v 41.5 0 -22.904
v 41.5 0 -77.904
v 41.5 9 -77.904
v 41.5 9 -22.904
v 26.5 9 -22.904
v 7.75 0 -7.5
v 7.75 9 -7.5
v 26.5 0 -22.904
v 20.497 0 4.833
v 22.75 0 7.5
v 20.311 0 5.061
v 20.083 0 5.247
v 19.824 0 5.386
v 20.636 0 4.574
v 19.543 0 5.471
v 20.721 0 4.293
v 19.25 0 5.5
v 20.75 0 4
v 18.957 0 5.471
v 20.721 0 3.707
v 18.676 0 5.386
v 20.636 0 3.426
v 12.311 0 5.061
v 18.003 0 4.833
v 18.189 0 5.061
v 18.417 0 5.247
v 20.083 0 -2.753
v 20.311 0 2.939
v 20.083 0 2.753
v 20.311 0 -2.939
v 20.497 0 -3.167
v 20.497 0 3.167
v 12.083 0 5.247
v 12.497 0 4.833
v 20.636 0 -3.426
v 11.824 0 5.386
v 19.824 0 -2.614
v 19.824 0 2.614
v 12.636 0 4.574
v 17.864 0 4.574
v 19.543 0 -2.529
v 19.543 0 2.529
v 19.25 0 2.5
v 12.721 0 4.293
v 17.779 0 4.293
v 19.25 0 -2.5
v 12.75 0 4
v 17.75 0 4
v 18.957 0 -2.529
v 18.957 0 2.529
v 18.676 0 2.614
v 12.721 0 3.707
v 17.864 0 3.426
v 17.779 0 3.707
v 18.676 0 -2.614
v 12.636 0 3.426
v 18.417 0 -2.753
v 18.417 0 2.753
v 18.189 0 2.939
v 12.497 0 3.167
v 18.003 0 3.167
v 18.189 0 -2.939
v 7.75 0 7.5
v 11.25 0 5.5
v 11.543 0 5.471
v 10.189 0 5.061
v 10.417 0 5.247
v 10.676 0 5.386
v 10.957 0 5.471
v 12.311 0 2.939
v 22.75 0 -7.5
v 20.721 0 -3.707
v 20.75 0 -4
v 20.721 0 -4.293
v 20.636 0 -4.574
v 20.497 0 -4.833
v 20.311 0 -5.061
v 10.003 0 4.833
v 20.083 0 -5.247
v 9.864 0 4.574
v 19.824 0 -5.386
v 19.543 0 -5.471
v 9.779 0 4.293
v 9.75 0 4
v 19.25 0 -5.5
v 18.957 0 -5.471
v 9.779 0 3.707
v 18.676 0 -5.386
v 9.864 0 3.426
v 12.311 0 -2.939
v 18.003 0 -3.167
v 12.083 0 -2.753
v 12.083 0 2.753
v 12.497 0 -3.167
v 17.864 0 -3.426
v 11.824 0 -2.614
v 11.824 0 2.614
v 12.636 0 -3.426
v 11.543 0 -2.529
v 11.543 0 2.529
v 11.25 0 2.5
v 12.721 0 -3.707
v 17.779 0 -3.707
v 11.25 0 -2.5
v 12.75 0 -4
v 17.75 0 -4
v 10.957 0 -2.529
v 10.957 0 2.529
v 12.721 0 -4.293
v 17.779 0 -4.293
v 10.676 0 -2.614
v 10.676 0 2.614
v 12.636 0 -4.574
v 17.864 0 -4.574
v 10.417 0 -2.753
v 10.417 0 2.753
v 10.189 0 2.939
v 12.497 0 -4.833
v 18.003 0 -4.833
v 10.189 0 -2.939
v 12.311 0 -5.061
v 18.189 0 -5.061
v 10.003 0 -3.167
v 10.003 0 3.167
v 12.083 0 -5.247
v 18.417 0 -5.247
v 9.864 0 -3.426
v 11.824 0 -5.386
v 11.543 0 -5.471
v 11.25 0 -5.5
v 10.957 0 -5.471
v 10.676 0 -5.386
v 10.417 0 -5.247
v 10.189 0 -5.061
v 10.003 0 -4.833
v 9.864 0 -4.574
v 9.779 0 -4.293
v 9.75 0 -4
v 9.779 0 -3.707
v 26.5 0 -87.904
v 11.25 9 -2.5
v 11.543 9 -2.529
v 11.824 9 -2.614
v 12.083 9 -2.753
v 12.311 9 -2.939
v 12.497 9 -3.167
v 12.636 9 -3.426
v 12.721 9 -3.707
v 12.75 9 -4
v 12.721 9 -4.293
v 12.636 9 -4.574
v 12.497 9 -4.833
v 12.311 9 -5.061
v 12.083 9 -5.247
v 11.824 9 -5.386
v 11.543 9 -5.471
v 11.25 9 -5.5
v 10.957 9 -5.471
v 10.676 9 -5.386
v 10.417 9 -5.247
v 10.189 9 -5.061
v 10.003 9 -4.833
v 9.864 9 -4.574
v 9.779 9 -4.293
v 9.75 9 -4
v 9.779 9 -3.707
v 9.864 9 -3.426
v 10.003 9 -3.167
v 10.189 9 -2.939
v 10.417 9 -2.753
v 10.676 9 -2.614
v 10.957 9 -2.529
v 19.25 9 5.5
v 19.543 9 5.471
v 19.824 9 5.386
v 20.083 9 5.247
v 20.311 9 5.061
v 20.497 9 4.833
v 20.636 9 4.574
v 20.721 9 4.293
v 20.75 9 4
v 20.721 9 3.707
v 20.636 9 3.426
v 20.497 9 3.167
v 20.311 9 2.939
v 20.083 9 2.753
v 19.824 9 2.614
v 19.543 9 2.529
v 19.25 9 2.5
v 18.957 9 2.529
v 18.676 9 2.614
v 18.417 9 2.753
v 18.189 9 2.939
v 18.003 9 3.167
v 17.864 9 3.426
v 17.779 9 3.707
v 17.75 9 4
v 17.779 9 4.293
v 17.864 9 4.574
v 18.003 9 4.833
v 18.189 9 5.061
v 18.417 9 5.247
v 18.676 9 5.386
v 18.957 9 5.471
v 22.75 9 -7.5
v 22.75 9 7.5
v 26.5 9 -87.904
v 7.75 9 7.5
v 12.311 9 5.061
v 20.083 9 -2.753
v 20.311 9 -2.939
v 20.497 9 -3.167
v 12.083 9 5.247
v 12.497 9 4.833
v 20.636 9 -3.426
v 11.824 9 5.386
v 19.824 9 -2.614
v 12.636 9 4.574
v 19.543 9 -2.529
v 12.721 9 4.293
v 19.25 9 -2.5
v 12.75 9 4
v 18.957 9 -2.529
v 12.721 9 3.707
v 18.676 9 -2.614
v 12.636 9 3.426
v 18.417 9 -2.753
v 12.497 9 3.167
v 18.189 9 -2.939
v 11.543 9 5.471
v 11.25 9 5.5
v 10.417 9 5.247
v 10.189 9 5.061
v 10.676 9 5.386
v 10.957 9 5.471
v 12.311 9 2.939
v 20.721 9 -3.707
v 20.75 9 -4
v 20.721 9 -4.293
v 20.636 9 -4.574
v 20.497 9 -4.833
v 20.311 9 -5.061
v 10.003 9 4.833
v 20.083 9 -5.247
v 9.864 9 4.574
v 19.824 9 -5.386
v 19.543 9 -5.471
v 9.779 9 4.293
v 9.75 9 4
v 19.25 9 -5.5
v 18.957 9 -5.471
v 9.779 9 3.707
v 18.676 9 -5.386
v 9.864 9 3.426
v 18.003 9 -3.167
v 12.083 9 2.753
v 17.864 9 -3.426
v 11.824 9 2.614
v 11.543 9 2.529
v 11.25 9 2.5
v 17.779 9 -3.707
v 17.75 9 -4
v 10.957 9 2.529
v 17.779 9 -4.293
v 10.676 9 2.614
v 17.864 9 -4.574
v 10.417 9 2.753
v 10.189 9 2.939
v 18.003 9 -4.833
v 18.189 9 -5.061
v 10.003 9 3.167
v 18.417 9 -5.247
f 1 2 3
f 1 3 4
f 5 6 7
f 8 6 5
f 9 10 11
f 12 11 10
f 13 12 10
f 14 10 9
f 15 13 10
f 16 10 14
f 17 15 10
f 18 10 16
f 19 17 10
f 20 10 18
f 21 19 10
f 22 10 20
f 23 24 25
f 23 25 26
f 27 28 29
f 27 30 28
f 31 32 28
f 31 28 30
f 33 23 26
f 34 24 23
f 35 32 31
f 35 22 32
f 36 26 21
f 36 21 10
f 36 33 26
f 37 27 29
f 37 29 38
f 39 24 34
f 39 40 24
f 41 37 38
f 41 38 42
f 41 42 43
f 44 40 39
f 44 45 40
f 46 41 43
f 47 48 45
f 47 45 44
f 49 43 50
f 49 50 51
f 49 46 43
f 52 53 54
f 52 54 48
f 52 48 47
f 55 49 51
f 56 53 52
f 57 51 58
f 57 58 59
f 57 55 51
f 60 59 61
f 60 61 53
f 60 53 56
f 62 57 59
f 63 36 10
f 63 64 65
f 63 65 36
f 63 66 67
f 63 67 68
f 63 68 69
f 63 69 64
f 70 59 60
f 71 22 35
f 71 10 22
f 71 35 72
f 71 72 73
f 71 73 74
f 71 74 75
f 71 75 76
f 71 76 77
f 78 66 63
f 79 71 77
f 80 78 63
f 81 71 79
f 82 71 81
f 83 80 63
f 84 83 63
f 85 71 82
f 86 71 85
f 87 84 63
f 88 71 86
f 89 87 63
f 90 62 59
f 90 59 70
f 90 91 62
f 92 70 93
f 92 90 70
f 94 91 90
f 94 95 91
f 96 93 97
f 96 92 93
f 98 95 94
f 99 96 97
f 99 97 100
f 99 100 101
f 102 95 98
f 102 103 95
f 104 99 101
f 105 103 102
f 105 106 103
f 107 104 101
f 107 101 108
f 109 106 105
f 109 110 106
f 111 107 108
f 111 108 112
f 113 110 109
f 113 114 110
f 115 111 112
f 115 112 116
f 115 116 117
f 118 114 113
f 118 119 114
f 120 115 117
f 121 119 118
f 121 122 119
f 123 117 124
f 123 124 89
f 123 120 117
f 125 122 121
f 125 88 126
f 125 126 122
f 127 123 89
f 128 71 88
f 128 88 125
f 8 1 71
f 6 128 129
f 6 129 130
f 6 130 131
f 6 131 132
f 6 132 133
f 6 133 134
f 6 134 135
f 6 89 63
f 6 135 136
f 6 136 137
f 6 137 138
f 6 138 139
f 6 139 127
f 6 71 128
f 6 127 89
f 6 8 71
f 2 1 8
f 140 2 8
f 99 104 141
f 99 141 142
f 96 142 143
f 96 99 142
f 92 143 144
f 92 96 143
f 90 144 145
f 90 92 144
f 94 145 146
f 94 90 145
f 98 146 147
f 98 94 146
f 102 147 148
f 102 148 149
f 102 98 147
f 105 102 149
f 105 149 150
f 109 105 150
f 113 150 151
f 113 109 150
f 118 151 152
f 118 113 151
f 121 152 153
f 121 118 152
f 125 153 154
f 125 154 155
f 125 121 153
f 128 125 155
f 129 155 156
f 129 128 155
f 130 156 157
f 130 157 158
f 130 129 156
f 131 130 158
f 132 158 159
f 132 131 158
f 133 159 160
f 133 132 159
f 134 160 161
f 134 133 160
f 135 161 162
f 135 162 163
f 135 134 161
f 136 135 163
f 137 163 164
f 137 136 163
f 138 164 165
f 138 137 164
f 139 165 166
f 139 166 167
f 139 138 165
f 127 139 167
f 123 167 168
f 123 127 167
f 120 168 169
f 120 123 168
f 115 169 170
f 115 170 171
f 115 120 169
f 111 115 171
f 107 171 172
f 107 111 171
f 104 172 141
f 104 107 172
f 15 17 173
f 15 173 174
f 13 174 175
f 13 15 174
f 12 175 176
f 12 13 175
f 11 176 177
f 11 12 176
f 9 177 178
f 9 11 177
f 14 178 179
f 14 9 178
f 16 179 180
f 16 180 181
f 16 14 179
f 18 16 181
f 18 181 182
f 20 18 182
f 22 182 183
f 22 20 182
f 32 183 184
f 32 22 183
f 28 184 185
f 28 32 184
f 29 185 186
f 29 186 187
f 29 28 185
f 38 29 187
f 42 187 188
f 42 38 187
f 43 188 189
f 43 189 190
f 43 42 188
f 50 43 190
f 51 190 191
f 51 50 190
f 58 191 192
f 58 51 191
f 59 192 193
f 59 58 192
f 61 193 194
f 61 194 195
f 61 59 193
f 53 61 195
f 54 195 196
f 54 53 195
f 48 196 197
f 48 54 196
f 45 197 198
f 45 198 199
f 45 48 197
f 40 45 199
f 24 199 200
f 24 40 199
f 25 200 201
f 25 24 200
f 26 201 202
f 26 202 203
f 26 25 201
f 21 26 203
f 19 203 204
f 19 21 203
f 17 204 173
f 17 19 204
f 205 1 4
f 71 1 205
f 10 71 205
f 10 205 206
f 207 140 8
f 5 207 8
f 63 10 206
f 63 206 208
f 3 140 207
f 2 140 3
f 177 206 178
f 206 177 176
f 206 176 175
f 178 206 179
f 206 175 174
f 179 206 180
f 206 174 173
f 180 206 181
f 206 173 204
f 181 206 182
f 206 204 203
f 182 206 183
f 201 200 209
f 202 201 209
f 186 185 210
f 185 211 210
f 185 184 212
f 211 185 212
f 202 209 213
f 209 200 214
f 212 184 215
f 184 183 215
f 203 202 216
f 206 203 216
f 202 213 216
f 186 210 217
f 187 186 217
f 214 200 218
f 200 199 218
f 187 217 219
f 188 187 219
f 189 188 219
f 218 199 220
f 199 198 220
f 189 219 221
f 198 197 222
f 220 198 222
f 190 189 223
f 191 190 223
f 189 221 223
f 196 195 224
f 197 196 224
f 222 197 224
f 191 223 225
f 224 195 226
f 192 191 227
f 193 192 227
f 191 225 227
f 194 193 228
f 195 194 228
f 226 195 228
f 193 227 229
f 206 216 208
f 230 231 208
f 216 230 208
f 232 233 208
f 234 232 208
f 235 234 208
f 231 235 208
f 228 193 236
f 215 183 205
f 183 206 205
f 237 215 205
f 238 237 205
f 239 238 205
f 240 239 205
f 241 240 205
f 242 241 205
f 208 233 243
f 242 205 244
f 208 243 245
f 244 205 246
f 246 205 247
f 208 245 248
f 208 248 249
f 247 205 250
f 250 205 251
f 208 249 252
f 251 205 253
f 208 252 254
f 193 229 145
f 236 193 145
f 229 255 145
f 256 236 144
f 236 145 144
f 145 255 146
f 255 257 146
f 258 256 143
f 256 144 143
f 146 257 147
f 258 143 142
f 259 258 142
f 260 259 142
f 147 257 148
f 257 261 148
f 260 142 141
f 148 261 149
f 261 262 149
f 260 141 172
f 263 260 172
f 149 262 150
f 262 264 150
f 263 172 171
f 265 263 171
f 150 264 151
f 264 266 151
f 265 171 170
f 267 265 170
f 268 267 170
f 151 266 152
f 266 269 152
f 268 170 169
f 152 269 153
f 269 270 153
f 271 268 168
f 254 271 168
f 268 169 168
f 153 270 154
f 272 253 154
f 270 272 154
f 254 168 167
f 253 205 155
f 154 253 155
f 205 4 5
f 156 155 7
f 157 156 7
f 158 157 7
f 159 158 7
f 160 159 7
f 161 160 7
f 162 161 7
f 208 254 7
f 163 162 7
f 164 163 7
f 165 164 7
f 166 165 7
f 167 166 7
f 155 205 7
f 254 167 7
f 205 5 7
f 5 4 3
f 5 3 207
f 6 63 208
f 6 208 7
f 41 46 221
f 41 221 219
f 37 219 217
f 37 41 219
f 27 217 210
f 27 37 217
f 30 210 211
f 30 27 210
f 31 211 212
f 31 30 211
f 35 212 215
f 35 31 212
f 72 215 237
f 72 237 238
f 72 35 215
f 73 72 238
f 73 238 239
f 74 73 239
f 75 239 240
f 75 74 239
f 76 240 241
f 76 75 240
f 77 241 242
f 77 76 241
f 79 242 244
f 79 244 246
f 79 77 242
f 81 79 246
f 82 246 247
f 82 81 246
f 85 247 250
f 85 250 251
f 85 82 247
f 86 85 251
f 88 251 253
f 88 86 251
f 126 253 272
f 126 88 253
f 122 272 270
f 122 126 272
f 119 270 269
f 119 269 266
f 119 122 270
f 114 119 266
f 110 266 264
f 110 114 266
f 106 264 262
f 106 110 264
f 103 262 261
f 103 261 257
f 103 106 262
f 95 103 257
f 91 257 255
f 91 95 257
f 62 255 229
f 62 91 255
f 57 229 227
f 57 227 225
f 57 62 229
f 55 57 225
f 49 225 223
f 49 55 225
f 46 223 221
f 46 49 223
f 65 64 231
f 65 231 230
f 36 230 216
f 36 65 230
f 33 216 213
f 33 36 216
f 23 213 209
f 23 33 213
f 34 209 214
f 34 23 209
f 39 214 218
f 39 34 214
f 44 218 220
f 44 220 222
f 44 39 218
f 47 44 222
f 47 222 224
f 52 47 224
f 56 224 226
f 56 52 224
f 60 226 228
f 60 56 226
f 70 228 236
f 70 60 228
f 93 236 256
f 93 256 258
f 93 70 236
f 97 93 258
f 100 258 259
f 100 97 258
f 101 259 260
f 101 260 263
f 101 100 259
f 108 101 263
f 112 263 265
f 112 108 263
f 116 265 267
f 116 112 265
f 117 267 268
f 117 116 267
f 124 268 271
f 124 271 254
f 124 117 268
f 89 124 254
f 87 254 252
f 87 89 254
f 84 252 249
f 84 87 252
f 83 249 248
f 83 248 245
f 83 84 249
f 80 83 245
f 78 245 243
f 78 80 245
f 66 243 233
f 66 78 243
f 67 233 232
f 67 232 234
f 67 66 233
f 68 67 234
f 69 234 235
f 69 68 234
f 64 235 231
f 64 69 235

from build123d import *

# Parameters (mm, degrees)
CROQUIS1_R              = 1.5
SALIENTE_EXTRUIR1_DEPTH = 9


with BuildPart() as part:
    # Croquis1 → Saliente-Extruir1 (new body)
    with BuildSketch(Plane(origin=(0, 0, 0), x_dir=(1, 0, 0), z_dir=(0, 1, 0))):
        Polygon((7.75, 7.5), (26.5, 22.904273087), (26.5, 77.904273087), (26.5, 87.904273087), (41.5, 77.904273087), (41.5, 22.904273087), (22.75, 7.5), (22.75, -7.5), (7.75, -7.5), align=None)
        with Locations(Location((19.25, 4, 0), (0, 0, 270))):
            Circle(CROQUIS1_R, mode=Mode.SUBTRACT)
        with Locations(Location((19.25, -4, 0), (0, 0, 270))):
            Circle(CROQUIS1_R, mode=Mode.SUBTRACT)
        with Locations(Location((11.25, -4, 0), (0, 0, 270))):
            Circle(CROQUIS1_R, mode=Mode.SUBTRACT)
        with Locations(Location((11.25, 4, 0), (0, 0, 270))):
            Circle(CROQUIS1_R, mode=Mode.SUBTRACT)
    extrude(amount=SALIENTE_EXTRUIR1_DEPTH)


solid = part.part
